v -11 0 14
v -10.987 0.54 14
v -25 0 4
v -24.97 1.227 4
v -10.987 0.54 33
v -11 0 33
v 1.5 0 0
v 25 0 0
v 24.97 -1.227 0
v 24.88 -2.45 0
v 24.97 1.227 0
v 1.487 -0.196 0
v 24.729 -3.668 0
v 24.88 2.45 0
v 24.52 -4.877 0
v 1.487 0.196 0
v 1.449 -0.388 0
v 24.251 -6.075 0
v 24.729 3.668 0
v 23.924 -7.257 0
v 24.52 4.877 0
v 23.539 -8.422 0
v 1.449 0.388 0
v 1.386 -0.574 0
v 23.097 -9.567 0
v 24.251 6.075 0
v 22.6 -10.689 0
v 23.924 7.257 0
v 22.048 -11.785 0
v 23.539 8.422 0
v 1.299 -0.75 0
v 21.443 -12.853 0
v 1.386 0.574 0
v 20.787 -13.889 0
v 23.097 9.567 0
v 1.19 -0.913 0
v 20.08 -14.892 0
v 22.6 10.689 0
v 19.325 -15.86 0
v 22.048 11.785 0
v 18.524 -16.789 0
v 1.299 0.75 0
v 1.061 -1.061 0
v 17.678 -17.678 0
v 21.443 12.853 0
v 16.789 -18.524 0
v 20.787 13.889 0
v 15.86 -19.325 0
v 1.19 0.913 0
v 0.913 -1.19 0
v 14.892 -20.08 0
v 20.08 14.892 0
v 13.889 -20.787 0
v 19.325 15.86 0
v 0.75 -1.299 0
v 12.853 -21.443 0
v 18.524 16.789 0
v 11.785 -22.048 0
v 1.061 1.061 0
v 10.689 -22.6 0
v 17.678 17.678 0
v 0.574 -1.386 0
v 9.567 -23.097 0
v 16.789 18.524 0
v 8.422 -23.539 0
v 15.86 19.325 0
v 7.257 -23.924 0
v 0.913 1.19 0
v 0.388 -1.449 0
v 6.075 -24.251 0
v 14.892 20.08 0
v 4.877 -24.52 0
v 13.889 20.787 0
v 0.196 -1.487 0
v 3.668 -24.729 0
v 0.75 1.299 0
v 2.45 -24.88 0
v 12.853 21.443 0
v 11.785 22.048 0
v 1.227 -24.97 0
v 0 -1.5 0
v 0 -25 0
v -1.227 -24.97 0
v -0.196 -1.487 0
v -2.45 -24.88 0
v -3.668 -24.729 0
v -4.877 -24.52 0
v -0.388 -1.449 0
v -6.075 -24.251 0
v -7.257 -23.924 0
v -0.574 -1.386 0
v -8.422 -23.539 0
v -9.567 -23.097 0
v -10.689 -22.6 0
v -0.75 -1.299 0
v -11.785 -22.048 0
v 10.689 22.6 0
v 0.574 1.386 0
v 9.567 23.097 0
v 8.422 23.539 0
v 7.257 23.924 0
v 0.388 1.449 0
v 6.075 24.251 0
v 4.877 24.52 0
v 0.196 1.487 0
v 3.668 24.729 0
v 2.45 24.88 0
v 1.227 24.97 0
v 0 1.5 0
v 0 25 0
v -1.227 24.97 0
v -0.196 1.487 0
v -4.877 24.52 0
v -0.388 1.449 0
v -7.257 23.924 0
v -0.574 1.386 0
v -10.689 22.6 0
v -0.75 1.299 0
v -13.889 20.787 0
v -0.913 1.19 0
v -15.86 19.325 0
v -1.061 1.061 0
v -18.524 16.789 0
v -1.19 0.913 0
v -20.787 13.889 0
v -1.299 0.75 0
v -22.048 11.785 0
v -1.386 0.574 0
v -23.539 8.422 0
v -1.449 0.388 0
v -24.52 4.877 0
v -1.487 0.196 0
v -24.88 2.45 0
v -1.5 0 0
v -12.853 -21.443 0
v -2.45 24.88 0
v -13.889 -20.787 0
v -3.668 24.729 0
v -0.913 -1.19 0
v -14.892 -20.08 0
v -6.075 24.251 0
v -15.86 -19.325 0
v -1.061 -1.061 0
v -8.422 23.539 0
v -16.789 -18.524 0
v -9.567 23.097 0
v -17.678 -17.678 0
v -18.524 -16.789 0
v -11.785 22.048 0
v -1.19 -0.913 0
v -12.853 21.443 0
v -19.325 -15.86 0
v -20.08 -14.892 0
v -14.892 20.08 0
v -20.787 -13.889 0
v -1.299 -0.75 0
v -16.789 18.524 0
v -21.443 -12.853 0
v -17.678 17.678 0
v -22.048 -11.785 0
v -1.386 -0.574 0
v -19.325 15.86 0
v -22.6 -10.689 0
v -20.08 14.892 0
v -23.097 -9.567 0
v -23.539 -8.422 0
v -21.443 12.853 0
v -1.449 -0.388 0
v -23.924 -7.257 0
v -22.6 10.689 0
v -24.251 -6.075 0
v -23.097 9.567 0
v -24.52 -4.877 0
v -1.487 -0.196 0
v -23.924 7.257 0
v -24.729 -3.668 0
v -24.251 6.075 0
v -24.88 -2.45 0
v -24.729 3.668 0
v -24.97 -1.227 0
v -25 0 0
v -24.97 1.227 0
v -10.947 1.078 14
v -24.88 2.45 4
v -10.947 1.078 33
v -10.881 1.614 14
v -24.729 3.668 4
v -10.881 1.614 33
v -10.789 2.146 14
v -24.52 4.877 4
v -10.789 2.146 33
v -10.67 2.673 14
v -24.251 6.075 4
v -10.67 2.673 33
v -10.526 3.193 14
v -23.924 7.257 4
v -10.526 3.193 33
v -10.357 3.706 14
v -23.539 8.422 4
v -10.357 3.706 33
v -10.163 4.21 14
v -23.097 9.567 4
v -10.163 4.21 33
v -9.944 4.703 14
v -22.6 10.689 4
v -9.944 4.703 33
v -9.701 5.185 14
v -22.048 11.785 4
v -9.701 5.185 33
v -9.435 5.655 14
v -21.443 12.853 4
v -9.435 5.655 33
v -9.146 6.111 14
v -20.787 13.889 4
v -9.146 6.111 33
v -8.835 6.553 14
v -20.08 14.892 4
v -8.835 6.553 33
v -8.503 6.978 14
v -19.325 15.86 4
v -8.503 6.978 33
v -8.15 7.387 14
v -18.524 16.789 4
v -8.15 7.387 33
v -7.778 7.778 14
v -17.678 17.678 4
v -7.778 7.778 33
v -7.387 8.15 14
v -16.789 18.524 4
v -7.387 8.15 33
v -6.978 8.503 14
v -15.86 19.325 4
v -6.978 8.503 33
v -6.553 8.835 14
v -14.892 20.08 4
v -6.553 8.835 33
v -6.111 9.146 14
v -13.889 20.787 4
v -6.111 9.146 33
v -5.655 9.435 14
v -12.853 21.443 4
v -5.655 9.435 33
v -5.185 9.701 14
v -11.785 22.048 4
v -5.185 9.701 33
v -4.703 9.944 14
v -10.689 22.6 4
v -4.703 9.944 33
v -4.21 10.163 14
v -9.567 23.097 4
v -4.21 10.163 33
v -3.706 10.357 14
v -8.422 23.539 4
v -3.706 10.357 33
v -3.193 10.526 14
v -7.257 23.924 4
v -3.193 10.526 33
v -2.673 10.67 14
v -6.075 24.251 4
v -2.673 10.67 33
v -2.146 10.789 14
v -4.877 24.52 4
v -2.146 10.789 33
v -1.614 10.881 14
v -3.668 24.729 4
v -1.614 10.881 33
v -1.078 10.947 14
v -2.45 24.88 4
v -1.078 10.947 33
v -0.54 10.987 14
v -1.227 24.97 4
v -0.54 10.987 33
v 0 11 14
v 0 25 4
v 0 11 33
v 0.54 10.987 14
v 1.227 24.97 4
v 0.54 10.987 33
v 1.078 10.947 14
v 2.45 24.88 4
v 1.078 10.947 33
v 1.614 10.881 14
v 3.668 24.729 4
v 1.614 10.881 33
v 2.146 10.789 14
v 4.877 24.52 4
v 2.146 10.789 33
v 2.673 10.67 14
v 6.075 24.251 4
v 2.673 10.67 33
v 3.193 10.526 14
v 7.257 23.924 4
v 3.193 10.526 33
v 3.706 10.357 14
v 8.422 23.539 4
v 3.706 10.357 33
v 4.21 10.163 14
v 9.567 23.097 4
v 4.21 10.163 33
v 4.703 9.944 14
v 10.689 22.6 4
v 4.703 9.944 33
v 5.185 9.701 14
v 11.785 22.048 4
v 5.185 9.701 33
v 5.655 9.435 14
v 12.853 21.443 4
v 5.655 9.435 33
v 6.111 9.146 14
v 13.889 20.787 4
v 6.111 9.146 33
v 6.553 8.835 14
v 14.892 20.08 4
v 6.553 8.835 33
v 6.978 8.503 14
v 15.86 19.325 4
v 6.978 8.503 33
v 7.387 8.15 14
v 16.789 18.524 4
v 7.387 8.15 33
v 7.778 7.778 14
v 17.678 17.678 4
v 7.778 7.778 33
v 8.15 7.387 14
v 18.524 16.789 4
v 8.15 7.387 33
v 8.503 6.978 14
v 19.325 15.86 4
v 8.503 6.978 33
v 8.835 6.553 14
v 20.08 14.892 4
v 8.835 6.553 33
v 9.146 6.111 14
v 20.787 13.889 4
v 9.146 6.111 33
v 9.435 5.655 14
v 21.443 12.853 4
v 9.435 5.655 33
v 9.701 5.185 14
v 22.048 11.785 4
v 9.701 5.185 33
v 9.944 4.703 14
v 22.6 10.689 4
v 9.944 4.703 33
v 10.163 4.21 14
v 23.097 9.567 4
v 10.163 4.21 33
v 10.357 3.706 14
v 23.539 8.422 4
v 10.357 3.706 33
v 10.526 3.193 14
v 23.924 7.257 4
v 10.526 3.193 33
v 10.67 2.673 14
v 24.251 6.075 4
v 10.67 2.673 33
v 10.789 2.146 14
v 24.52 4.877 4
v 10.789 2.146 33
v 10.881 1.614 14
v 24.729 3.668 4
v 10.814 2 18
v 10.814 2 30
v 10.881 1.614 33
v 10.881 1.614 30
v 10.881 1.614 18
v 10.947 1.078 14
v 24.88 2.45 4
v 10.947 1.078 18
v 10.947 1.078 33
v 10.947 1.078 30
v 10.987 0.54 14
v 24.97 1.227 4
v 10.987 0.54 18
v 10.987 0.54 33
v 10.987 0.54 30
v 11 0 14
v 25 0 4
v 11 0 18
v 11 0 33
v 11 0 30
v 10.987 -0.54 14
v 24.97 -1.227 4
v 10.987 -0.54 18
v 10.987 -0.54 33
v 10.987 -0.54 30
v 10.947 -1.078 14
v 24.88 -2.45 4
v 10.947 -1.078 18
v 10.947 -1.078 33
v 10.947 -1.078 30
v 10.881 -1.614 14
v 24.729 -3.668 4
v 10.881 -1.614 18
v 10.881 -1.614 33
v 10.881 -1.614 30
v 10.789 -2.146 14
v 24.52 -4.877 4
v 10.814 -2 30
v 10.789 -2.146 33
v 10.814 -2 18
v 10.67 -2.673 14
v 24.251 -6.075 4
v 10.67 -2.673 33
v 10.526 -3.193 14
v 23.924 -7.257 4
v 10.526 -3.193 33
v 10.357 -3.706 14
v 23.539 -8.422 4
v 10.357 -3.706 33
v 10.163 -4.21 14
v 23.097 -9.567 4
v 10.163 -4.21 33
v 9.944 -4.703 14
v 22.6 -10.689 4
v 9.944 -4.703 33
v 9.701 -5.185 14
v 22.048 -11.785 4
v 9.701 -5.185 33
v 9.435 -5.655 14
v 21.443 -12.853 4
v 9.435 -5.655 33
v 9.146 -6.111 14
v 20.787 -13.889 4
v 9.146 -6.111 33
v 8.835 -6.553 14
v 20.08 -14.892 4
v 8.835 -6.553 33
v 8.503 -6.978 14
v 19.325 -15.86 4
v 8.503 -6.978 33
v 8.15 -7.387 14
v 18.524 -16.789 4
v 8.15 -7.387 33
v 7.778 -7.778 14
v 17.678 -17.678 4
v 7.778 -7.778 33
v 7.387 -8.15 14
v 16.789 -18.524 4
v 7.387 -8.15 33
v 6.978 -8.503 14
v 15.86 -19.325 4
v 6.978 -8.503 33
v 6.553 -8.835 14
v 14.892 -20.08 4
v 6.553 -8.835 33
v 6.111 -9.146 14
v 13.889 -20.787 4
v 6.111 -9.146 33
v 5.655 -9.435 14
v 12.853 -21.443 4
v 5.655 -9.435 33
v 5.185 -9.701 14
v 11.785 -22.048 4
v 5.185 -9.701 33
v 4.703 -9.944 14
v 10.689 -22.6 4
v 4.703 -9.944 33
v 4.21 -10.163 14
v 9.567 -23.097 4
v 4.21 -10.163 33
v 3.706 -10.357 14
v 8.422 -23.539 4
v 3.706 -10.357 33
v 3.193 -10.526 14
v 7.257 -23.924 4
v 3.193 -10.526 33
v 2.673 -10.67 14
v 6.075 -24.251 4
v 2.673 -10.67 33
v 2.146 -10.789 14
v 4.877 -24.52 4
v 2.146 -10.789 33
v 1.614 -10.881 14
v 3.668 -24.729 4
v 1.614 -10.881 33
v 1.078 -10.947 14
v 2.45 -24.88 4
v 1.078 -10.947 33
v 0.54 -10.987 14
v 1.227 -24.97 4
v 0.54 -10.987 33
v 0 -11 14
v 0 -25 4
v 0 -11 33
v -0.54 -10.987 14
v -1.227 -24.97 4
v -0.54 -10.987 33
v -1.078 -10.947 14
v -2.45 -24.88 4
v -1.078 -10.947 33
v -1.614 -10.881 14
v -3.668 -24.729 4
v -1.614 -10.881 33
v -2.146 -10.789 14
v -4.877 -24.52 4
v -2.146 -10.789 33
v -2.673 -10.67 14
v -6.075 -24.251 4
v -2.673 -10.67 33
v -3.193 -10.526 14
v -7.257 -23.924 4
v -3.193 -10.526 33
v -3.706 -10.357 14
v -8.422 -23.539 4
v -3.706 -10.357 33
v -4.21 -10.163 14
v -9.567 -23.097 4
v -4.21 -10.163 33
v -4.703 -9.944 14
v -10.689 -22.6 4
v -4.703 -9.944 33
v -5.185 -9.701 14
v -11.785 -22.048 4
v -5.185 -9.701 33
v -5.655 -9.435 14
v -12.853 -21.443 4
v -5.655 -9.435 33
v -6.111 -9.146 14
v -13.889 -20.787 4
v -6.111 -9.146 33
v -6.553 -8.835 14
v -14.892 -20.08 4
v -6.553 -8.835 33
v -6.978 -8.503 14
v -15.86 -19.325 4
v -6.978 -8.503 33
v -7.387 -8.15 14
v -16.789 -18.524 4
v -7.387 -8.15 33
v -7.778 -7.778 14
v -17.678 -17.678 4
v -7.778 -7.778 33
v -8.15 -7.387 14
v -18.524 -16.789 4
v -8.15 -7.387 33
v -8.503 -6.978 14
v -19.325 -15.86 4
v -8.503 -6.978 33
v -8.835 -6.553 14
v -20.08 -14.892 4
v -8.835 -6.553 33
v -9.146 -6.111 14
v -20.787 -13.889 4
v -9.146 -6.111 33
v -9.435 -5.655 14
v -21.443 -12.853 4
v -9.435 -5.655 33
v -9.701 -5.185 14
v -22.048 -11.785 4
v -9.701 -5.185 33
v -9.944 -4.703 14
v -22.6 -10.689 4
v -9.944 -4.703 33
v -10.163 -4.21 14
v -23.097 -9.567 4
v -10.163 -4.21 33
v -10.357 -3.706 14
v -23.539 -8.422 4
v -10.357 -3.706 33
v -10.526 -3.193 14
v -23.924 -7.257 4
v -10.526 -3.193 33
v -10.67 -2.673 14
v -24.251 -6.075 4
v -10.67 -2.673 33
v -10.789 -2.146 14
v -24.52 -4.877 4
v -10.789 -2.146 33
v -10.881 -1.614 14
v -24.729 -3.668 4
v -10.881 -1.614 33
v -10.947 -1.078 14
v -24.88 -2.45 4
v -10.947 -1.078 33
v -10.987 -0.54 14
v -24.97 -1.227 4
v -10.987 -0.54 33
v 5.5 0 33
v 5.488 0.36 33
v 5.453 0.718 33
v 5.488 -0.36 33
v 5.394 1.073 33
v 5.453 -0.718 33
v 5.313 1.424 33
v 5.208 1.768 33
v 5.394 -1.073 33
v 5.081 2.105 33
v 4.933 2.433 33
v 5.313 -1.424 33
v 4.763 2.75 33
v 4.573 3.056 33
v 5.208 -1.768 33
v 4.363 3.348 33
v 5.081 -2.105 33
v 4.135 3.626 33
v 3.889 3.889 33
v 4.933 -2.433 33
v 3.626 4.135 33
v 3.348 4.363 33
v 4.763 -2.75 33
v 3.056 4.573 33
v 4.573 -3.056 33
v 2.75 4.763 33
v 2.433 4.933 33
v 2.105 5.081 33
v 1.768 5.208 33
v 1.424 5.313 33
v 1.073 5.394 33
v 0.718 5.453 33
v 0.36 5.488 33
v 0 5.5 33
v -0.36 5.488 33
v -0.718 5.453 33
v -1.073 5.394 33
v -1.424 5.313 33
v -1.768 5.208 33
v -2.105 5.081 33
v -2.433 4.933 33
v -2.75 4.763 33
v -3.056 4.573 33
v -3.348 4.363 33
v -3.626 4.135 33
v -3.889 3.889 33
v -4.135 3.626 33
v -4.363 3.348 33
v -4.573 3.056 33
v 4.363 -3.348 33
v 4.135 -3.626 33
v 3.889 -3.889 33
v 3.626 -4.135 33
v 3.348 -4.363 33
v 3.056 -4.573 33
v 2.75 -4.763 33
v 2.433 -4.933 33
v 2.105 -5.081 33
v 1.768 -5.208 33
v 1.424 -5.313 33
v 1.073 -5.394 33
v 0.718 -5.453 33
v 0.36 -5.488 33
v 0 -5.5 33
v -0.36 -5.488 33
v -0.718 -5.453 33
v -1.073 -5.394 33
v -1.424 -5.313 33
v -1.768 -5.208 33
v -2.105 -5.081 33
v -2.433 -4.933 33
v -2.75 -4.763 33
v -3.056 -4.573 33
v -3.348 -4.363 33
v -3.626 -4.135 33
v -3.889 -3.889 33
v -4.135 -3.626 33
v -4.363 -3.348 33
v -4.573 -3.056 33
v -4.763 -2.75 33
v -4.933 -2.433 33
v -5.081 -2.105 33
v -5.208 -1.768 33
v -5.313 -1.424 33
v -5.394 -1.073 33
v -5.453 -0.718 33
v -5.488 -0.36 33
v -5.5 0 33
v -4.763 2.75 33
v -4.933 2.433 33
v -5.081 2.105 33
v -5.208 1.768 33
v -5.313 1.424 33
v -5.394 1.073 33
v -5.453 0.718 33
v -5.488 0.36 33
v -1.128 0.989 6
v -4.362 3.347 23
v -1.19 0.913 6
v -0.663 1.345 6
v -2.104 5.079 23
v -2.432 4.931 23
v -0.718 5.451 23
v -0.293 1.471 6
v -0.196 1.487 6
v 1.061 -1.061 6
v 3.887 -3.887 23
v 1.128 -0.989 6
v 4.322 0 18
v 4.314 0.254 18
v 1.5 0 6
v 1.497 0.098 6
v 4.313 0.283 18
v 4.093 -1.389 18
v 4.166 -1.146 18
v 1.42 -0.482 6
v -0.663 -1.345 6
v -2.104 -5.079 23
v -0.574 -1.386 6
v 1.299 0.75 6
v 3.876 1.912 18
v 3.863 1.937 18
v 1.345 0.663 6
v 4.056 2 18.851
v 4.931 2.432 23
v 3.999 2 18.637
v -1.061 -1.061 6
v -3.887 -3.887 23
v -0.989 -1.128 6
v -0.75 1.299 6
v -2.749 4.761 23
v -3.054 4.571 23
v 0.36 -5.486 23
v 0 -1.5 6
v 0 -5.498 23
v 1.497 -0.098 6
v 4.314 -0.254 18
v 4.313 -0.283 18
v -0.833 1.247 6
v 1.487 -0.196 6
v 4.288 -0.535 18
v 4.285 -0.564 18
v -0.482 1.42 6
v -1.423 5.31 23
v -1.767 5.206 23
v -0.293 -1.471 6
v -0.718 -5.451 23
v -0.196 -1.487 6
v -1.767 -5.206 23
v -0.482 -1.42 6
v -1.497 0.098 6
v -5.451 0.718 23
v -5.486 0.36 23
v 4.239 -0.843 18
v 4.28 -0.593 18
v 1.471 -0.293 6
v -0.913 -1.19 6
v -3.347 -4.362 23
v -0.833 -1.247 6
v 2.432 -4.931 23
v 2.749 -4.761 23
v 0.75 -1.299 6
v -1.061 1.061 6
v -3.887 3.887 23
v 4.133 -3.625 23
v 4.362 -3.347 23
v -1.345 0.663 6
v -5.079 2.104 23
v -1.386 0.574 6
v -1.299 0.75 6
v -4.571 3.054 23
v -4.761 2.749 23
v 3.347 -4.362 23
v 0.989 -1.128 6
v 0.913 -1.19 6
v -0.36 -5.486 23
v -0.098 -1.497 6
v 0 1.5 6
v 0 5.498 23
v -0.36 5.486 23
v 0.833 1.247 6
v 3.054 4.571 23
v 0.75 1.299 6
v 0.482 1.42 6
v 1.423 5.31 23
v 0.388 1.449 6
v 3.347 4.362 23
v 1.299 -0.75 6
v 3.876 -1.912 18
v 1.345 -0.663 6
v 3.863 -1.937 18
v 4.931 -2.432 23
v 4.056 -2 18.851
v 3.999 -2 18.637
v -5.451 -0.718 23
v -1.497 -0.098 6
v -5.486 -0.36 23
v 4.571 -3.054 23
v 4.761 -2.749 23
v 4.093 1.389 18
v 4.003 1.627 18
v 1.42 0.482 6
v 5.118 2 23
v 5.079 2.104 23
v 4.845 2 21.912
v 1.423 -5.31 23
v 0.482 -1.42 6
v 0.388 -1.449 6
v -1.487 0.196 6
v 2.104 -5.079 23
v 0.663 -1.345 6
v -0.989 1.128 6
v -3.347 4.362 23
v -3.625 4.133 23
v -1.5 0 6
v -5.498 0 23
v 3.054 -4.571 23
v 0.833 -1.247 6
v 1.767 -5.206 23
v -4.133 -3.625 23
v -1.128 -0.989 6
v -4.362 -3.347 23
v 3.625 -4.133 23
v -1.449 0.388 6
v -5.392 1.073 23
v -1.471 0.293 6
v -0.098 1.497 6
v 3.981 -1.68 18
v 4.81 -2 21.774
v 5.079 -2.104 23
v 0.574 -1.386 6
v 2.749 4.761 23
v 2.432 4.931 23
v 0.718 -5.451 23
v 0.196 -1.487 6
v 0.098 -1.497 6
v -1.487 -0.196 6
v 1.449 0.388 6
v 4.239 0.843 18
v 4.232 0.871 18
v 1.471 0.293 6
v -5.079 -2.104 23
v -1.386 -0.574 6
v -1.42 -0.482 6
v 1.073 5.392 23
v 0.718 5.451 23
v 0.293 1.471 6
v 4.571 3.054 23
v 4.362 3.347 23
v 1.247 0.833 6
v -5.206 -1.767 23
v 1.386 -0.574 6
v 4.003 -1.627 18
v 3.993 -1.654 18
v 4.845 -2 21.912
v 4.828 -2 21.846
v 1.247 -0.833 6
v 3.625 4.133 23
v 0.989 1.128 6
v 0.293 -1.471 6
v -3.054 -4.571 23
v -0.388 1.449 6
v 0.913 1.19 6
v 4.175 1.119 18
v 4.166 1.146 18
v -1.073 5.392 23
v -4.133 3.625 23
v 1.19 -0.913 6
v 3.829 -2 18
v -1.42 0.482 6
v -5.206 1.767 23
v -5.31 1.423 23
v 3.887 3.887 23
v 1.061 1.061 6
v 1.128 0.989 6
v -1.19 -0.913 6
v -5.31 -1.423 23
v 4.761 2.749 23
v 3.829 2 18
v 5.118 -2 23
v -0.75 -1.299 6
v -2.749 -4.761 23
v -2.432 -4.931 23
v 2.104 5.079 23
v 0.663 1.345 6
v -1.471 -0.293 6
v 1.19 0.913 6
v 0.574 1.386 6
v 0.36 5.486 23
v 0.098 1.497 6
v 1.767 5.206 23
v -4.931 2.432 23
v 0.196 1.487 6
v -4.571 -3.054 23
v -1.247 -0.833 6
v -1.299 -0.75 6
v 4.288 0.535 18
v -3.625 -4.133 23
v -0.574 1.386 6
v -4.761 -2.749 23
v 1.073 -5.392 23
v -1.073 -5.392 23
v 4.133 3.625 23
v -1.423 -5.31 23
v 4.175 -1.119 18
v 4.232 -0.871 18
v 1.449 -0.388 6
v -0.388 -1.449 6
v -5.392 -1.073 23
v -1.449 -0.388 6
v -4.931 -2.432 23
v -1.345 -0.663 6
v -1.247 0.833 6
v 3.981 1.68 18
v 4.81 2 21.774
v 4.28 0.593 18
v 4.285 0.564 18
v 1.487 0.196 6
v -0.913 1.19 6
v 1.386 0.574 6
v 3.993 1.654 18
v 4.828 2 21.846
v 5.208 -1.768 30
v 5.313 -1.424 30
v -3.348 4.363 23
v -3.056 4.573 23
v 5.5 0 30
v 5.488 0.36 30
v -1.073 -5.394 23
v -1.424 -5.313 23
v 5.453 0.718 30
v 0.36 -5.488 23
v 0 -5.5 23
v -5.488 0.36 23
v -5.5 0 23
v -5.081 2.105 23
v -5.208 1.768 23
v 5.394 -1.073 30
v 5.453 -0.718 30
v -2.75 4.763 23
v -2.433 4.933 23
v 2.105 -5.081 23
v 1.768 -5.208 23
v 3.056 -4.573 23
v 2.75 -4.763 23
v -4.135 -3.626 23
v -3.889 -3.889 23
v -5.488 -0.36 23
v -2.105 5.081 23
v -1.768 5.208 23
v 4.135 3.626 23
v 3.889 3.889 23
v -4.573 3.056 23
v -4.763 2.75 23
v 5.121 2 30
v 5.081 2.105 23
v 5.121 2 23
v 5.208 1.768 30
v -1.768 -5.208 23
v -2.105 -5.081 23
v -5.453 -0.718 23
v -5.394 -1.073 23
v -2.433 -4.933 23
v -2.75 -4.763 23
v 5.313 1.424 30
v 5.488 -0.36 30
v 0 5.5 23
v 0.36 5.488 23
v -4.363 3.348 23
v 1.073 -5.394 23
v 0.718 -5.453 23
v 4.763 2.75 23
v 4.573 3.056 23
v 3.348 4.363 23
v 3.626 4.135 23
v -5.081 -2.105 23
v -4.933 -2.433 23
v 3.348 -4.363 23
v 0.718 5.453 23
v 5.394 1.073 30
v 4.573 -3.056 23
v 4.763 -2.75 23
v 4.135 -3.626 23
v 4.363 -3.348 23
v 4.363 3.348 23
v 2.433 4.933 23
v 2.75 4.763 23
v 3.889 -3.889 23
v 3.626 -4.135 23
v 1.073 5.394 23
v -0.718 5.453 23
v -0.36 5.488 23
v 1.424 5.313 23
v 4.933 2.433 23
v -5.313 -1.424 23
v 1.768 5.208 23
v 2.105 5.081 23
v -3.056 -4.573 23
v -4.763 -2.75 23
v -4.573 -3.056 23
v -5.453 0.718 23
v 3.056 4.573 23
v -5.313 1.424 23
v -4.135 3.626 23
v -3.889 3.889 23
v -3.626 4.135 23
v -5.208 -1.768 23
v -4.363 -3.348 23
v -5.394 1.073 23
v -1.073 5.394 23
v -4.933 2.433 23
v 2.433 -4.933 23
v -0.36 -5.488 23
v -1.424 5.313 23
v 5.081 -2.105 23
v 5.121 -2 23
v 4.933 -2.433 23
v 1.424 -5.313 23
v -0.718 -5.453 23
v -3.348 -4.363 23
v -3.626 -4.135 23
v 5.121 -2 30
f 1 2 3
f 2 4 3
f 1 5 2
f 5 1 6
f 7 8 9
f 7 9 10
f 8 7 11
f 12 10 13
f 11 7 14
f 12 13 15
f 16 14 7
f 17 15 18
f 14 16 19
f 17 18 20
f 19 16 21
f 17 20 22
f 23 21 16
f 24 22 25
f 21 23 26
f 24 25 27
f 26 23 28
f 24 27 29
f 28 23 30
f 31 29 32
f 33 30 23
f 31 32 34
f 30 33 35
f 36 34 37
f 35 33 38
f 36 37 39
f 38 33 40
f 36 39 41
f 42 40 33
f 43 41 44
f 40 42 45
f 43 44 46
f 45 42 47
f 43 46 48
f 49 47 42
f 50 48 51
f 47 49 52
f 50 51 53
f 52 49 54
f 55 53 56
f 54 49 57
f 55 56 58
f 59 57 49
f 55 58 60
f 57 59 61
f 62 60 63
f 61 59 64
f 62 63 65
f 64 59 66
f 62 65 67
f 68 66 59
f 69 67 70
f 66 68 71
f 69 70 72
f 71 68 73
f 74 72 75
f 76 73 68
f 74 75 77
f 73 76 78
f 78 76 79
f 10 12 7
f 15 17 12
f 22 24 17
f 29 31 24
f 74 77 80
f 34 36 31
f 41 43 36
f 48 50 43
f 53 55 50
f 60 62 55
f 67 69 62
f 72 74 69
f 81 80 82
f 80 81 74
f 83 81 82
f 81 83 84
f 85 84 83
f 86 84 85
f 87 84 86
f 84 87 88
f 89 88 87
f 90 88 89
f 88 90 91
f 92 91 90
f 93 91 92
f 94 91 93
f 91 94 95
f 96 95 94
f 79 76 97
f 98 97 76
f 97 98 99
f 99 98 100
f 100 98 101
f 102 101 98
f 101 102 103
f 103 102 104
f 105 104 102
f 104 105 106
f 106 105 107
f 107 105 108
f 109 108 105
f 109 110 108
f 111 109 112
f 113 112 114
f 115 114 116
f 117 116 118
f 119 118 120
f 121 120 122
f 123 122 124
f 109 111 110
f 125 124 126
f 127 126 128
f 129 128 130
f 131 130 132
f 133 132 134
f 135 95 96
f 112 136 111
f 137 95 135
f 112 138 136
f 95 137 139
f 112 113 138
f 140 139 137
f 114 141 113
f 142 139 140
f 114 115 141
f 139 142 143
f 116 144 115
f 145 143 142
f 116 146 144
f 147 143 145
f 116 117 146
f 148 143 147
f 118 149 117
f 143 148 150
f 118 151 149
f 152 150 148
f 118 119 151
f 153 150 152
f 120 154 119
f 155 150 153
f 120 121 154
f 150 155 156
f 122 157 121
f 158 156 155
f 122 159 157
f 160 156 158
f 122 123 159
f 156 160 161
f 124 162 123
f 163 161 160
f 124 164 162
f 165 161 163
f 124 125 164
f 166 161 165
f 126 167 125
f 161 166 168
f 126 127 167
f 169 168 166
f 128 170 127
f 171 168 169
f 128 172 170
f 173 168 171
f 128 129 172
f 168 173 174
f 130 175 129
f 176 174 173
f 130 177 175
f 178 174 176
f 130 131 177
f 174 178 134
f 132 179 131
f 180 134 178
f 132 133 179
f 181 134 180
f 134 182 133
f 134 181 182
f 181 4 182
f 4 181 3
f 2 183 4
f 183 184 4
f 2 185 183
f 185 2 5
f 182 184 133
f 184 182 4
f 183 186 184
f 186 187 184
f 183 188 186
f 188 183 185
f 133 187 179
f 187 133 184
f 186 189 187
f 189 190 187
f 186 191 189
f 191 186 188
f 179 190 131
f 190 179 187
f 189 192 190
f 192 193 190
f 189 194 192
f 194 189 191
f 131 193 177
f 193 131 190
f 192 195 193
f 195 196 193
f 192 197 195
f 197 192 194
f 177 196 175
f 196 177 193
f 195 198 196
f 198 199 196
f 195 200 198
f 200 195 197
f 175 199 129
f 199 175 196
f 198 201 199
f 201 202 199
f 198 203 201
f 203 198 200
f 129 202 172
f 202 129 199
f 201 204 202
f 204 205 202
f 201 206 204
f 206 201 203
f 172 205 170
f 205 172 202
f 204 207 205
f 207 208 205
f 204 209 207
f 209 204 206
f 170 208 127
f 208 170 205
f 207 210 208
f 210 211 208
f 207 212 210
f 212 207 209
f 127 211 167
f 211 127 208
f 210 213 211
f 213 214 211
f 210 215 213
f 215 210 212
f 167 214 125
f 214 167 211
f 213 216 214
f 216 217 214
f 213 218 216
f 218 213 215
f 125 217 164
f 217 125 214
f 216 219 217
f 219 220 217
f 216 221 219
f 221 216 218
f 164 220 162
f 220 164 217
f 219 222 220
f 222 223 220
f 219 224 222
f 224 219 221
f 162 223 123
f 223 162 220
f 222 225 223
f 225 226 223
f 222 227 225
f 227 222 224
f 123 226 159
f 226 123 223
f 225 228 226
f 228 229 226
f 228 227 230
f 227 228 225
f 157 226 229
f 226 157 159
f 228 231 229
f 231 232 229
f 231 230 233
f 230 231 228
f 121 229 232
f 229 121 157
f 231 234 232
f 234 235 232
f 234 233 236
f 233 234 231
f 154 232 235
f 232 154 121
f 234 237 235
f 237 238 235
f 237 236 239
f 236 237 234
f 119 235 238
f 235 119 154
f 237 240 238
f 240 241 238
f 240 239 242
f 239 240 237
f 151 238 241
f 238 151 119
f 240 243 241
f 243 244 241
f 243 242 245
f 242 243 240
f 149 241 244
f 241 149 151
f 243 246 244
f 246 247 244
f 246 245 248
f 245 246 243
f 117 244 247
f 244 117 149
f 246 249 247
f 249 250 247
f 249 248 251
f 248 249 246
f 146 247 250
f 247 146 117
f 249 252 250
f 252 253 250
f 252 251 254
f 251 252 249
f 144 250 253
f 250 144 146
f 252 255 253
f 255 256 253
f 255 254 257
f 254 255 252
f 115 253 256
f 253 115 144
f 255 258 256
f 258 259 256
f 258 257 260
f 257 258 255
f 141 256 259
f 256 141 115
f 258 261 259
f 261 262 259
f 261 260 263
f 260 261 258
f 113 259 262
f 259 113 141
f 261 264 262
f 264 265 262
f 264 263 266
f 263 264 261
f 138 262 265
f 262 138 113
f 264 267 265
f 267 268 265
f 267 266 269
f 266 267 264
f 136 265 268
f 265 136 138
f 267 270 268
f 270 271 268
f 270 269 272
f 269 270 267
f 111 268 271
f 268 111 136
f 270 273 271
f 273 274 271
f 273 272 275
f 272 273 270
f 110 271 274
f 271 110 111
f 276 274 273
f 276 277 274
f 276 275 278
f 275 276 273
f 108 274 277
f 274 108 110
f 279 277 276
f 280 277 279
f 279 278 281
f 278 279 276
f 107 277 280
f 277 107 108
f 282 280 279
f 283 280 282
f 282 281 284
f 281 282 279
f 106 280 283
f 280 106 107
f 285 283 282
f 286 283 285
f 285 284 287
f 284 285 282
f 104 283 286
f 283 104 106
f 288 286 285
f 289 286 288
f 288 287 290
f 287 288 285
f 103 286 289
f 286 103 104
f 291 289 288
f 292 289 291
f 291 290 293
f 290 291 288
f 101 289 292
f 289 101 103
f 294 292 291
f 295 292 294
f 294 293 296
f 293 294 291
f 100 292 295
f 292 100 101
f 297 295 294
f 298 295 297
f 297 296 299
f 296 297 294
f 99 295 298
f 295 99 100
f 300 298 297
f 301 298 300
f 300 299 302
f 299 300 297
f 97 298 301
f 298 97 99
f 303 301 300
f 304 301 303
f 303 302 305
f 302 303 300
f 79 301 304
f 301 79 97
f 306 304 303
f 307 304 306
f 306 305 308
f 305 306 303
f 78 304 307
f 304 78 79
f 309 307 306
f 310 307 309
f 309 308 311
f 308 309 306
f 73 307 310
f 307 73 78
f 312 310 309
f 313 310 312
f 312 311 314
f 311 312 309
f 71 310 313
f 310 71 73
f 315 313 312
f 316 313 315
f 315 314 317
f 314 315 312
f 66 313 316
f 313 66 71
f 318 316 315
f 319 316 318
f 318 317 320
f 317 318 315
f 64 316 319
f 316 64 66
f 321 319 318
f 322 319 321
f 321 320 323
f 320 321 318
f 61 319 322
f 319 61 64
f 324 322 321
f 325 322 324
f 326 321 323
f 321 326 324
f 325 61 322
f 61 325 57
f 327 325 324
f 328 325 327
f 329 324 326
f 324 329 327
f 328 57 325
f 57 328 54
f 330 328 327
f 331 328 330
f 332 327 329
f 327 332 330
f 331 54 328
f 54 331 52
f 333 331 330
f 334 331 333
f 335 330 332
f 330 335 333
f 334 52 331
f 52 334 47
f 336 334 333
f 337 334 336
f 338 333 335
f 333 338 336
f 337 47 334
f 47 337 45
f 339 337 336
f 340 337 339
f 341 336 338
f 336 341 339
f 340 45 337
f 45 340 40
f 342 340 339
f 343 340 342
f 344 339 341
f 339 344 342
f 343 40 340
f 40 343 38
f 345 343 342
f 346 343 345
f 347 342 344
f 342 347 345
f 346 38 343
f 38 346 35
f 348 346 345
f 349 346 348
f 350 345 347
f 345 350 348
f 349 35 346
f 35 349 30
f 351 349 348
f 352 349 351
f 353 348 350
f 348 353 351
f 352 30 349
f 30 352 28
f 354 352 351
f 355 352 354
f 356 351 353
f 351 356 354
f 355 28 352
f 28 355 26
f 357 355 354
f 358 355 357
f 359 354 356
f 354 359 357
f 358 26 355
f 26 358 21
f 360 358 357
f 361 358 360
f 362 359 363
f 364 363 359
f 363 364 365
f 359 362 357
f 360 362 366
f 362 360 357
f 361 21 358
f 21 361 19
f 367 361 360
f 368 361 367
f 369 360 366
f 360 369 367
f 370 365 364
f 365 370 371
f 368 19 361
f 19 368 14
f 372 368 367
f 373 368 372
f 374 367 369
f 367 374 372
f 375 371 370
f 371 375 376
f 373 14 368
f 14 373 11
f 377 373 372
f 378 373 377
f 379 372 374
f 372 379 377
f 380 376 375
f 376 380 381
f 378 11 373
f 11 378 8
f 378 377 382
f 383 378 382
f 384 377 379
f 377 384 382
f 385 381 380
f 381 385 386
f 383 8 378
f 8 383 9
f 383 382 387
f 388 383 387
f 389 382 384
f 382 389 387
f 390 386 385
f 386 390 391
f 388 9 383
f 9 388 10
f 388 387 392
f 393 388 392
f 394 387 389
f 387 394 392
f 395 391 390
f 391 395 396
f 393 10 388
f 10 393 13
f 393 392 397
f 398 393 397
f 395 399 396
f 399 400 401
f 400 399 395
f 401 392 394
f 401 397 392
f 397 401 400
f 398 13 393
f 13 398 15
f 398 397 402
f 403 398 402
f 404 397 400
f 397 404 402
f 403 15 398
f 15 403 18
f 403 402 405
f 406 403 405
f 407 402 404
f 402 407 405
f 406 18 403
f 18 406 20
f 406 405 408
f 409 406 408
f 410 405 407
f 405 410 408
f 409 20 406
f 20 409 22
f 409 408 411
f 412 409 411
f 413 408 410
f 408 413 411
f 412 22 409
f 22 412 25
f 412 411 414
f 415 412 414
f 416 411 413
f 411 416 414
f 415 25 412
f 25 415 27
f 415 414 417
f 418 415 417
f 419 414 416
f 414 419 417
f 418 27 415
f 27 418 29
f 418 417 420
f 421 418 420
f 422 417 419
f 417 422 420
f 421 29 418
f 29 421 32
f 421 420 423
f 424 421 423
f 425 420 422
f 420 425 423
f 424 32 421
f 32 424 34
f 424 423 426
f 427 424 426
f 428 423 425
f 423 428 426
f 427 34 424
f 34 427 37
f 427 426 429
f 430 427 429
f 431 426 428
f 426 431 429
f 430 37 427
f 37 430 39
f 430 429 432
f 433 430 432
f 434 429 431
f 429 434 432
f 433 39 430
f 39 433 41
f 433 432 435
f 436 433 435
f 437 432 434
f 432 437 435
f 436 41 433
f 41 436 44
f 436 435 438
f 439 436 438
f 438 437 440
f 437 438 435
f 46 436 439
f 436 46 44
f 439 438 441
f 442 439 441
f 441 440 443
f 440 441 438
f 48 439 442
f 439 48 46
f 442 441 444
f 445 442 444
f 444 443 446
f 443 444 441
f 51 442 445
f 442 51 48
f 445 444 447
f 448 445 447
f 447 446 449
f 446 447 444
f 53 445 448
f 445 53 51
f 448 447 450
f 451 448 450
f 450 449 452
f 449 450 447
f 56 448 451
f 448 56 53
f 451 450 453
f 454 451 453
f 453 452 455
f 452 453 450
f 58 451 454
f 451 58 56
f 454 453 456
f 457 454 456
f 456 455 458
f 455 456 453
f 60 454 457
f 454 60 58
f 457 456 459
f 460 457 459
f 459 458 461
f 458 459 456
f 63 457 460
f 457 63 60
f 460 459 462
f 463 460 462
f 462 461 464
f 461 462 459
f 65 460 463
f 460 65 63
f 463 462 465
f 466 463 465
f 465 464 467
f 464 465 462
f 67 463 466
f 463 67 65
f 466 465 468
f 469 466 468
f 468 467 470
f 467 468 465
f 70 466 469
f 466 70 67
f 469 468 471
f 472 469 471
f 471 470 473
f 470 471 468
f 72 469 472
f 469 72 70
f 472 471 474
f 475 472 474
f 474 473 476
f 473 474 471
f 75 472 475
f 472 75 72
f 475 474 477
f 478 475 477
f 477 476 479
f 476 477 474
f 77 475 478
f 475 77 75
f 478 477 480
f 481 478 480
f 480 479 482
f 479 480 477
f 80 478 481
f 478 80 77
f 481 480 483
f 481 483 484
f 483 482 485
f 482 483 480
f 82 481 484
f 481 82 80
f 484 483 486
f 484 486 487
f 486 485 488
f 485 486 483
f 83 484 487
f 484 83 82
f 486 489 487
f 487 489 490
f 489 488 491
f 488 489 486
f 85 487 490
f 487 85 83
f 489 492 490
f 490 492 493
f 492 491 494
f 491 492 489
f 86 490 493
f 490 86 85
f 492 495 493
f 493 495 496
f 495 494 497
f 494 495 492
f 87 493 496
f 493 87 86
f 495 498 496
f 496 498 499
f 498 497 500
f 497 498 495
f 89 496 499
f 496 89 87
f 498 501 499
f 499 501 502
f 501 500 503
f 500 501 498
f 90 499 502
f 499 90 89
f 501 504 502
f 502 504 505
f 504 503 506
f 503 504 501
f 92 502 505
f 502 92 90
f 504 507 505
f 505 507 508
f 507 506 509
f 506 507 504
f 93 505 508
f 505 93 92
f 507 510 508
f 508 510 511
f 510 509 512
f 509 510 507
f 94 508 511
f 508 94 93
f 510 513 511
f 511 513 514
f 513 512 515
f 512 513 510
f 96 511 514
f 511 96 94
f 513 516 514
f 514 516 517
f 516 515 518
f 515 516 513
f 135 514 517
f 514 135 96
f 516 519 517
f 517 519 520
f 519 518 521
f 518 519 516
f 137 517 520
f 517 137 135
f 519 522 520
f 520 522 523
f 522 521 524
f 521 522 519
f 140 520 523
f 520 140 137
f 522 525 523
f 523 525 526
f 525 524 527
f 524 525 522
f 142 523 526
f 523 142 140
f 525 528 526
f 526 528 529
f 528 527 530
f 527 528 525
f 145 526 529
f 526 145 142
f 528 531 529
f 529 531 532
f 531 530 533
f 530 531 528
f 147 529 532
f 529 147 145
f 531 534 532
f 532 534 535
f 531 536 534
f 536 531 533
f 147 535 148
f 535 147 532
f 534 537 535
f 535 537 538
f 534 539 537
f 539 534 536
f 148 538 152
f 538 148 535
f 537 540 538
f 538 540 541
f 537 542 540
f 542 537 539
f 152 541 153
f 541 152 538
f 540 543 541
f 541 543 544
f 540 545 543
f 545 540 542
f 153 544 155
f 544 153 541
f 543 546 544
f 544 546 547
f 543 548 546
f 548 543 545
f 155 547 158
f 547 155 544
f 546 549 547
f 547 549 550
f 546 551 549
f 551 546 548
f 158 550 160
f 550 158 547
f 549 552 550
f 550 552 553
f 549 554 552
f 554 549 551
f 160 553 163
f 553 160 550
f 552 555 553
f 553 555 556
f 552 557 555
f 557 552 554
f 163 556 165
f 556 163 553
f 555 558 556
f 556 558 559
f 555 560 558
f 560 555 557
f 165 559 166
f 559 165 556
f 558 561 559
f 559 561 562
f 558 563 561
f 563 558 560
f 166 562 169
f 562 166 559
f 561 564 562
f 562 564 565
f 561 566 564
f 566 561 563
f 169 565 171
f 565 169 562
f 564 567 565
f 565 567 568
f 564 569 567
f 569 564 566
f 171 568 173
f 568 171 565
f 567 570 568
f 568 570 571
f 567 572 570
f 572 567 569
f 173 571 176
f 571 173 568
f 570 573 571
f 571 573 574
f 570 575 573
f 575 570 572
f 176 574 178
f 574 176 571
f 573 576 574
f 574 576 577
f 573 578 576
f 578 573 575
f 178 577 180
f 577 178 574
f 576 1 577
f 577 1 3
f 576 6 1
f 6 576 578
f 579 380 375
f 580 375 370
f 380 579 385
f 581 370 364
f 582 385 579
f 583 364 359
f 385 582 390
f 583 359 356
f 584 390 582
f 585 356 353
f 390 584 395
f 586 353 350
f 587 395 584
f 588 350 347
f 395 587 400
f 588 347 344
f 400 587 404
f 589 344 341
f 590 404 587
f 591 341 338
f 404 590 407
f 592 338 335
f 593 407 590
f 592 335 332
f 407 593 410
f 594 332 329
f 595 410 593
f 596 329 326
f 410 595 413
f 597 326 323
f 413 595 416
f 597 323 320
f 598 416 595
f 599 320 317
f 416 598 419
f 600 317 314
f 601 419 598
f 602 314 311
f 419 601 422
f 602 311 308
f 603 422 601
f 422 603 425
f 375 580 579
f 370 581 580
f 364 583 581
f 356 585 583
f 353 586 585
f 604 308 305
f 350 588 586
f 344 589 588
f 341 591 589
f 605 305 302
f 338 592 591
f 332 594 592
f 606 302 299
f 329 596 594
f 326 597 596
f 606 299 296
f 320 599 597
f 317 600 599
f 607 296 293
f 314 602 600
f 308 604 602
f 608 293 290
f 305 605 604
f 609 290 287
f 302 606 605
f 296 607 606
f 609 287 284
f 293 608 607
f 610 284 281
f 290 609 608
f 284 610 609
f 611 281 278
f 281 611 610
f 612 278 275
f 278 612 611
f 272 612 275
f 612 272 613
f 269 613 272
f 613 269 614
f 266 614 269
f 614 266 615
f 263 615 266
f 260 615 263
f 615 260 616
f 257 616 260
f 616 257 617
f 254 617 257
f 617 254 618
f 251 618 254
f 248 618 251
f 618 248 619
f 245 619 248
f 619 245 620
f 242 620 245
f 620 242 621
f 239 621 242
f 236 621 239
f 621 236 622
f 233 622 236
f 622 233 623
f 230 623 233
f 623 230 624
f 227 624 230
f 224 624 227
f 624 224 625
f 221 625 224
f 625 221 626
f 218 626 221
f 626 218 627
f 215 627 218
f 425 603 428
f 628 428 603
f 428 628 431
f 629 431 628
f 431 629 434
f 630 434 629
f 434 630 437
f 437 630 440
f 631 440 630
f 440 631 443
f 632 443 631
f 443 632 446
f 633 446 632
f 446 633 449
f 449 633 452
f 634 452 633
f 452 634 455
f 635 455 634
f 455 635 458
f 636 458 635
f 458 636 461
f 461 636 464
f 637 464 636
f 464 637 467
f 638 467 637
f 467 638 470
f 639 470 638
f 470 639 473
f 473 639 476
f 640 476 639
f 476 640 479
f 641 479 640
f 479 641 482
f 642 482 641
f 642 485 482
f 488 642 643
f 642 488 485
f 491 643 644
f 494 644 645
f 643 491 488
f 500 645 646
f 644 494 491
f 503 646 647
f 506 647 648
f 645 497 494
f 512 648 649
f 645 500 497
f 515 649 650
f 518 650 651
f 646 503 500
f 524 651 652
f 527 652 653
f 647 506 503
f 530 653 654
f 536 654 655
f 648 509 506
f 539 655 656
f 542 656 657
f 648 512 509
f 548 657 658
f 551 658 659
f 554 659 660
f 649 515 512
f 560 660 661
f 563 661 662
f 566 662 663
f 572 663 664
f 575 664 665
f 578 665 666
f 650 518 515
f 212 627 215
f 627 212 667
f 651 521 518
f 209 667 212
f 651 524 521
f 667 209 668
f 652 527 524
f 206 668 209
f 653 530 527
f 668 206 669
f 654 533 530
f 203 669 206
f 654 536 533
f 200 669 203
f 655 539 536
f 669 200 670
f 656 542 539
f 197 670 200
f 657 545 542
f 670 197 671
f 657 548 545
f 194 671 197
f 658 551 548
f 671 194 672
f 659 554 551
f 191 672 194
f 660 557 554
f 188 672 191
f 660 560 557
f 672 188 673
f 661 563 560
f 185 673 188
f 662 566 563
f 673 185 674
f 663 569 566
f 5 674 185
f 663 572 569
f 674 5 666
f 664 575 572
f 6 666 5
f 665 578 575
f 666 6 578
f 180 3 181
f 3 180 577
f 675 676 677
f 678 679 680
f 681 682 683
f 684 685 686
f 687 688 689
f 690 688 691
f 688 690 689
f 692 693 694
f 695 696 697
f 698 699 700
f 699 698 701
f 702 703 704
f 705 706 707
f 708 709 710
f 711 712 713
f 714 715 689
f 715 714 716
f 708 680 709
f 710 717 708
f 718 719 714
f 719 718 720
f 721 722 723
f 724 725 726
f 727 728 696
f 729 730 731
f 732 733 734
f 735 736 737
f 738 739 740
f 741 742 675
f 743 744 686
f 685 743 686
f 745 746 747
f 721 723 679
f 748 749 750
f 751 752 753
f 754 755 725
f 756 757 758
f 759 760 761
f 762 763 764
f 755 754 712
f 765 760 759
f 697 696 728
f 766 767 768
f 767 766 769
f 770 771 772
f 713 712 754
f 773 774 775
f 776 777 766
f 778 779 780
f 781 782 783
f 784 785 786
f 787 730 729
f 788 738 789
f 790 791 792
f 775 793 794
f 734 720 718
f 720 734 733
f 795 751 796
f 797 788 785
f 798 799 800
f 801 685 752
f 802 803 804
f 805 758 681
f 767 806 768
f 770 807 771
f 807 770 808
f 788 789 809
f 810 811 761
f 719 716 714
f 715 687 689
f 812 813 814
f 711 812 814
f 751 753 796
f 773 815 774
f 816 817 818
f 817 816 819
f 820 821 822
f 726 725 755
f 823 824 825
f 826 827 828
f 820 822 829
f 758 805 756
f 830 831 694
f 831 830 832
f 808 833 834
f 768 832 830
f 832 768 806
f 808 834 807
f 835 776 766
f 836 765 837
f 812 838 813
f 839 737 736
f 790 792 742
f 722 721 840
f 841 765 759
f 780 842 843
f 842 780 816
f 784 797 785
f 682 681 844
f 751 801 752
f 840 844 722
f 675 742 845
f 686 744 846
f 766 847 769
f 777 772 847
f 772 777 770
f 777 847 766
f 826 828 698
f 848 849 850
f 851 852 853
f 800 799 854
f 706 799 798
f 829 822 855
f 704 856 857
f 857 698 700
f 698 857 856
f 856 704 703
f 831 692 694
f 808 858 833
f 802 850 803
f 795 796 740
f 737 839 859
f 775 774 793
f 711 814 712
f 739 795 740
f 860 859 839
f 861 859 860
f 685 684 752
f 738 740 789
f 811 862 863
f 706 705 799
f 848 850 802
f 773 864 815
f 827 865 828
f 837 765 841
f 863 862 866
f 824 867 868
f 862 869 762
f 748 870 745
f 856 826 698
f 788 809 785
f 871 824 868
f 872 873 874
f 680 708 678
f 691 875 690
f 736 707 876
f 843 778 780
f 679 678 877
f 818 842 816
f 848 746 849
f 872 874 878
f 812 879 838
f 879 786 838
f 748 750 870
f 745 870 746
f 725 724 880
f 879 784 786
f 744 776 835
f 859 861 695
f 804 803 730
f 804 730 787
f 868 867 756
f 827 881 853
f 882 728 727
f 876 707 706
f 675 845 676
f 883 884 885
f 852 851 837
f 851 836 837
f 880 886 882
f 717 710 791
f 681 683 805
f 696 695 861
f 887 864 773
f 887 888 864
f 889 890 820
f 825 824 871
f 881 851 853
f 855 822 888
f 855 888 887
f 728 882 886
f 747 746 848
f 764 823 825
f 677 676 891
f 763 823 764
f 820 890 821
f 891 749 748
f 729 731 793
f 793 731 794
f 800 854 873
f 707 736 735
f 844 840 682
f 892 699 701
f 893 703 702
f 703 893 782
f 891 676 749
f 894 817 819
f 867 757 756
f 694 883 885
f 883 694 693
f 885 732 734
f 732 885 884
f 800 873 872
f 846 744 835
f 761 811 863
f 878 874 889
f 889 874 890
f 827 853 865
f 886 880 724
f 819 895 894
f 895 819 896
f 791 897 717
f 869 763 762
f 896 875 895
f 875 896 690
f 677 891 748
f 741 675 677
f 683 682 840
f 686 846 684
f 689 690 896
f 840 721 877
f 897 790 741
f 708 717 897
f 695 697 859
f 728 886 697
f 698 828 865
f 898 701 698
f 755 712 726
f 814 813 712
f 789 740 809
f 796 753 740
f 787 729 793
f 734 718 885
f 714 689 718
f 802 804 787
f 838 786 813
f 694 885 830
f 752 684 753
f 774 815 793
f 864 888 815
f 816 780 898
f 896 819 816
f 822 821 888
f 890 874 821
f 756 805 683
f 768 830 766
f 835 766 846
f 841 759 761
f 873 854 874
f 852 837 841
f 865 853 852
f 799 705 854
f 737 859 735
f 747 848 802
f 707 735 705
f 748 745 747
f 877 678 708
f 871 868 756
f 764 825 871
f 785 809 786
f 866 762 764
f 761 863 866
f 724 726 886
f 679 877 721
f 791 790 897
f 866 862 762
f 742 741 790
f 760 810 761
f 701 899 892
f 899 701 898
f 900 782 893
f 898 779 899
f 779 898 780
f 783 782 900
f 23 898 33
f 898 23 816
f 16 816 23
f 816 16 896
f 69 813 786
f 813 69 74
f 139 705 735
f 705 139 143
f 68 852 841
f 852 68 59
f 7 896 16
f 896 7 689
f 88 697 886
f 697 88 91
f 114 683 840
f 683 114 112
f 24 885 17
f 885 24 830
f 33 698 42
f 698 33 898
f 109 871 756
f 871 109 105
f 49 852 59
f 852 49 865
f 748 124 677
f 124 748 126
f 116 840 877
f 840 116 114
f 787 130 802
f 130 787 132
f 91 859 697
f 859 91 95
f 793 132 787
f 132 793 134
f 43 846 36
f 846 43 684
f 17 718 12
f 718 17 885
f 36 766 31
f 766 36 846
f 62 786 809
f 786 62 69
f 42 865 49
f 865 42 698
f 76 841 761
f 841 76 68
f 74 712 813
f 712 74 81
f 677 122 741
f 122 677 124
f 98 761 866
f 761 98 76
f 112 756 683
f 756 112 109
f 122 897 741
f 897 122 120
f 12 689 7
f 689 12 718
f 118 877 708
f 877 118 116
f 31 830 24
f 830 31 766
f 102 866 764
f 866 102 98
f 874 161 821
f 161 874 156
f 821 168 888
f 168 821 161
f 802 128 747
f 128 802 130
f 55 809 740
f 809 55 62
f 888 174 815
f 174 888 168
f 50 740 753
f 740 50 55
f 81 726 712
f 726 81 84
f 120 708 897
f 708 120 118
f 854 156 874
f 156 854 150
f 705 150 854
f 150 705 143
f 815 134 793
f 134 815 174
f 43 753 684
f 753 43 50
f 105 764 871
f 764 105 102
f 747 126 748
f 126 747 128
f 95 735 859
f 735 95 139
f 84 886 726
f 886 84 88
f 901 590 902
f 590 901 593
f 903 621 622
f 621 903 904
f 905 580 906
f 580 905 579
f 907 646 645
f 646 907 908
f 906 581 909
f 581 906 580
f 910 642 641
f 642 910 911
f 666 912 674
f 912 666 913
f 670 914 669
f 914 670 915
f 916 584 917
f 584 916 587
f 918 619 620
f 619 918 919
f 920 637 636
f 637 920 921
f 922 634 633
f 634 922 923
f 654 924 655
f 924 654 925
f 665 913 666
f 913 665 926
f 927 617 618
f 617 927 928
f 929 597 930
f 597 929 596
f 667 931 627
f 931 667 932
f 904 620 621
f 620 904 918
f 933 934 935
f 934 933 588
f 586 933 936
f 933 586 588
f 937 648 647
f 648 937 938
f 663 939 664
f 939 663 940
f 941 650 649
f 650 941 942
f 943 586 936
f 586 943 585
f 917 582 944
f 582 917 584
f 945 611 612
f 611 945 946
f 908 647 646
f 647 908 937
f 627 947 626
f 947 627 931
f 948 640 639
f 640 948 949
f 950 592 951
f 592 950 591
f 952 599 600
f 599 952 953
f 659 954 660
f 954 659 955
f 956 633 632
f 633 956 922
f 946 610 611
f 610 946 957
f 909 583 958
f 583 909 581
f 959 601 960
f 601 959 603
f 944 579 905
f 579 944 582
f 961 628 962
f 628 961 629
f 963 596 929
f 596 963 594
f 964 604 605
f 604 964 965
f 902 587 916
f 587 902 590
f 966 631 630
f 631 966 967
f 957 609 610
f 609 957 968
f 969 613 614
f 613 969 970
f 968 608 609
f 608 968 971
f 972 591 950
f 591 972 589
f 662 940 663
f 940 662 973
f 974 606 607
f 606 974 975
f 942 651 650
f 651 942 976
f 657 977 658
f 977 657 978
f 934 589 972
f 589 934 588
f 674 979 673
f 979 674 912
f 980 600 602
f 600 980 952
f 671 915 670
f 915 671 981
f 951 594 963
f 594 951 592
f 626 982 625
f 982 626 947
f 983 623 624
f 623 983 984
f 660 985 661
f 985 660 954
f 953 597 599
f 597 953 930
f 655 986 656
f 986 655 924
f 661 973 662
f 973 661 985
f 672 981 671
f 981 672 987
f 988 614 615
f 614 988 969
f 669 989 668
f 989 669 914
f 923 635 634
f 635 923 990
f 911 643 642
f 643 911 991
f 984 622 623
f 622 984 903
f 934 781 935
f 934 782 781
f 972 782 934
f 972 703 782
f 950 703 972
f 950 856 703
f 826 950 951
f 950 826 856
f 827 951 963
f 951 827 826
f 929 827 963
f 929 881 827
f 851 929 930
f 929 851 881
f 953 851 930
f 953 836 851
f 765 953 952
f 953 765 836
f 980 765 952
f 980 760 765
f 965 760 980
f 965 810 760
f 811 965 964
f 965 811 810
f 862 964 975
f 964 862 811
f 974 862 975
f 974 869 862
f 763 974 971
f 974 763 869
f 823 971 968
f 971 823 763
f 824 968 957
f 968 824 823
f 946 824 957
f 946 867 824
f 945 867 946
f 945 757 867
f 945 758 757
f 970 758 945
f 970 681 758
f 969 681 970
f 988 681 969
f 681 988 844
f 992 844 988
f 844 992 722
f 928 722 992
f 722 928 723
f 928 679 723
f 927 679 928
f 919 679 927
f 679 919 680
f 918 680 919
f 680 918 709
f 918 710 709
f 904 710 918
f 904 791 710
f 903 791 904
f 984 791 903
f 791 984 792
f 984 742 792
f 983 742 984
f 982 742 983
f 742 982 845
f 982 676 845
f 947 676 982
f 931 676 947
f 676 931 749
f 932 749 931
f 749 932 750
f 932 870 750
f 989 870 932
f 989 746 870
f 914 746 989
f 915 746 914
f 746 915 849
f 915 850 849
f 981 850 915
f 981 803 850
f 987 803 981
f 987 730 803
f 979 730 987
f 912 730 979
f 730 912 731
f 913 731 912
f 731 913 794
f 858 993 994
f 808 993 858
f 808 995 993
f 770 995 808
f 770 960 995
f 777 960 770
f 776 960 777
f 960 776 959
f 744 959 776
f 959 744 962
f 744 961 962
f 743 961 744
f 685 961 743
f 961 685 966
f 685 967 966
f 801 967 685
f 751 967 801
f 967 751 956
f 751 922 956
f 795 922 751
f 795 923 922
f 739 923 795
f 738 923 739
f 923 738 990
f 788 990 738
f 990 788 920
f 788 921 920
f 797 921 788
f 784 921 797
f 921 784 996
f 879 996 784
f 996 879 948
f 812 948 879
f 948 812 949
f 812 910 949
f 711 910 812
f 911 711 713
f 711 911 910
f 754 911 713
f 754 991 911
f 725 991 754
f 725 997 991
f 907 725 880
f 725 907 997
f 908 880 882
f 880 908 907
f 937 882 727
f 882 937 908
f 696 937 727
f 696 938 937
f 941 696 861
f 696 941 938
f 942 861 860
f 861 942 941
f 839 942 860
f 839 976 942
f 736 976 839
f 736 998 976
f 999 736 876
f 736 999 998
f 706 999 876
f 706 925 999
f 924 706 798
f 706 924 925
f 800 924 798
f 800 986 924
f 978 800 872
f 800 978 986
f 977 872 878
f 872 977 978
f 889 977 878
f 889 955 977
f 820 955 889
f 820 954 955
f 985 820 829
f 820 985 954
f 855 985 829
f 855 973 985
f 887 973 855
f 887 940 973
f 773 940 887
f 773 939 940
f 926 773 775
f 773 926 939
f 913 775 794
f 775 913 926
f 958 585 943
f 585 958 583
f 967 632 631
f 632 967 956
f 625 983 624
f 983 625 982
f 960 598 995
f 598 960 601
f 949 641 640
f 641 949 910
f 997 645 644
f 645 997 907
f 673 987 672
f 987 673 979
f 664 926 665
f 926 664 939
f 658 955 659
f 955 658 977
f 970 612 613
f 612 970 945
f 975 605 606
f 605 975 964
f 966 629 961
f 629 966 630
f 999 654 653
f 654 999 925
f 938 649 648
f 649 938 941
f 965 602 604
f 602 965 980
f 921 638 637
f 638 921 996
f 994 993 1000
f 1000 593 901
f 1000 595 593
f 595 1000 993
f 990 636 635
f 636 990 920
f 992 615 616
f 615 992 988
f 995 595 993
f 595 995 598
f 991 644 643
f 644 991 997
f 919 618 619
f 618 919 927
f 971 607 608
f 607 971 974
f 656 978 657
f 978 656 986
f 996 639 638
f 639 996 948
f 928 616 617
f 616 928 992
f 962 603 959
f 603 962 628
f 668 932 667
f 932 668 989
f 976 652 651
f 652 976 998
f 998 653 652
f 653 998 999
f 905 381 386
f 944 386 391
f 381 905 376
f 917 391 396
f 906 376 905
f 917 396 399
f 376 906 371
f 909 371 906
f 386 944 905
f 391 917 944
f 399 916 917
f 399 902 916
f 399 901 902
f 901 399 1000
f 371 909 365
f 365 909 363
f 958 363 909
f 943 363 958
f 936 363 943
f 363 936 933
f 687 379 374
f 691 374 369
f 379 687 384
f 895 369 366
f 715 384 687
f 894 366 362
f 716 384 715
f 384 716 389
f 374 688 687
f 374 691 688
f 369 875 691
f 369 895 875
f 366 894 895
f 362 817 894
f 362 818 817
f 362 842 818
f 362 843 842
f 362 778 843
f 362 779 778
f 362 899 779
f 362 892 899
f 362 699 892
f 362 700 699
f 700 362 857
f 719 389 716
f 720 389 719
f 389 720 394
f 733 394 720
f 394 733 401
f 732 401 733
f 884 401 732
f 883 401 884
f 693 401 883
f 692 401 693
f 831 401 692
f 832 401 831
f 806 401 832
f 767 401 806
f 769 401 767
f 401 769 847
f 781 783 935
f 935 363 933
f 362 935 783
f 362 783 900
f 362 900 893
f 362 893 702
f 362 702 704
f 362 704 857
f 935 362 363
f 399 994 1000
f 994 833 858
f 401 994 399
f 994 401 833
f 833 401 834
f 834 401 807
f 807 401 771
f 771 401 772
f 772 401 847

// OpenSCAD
// KNOWN-WRONG PART (must fail): a 3 mm hole continues through the bottom of the stand
// Weighing stand that holds one 1.5 mL microcentrifuge tube upright on a balance pan
// Category: quick fixes. A revolved stand (base disc, cone, column) with a seat that follows the
// tube's conical tip, and a viewing window through the column wall on the +X side.
// Print: PLA or PETG, standing up, 0.2 mm layers. Tare the balance with the stand on it.
// SPDX-License-Identifier: CERN-OHL-P-2.0

/* [Stand] */
base_d = 50;  base_h = 4;       // disc z = 0 .. 4
col_d = 22;   cone_top = 14;    // cone 50 -> 22 mm from z = 4 to 14
height = 33;                    // column from z = 14 to 33
seat_d = 11;  seat_cyl_z = 23;  // 11 mm from the top down to z = 23 ...
tip_d = 3;    tip_z = 6;        // ... then a cone narrowing to 3 mm at z = 6
win_w = 4;    win_z = [18, 30]; // viewing window through the +X wall

/* [Hidden] */
$fn = 128;
eps = 0.01;

difference() {
    rotate_extrude() polygon([[0, 0], [base_d / 2, 0], [base_d / 2, base_h], [col_d / 2, cone_top],
                              [col_d / 2, height], [0, height]]);
    translate([0, 0, tip_z]) cylinder(d1 = tip_d, d2 = seat_d, h = seat_cyl_z - tip_z + eps, $fn = 96);
    translate([0, 0, -1]) cylinder(d = tip_d, h = tip_z + 2, $fn = 48);
    translate([0, 0, seat_cyl_z]) cylinder(d = seat_d, h = height - seat_cyl_z + 1, $fn = 96);
    translate([0, -win_w / 2, win_z[0]]) cube([col_d / 2 + 1, win_w, win_z[1] - win_z[0]]);
}
